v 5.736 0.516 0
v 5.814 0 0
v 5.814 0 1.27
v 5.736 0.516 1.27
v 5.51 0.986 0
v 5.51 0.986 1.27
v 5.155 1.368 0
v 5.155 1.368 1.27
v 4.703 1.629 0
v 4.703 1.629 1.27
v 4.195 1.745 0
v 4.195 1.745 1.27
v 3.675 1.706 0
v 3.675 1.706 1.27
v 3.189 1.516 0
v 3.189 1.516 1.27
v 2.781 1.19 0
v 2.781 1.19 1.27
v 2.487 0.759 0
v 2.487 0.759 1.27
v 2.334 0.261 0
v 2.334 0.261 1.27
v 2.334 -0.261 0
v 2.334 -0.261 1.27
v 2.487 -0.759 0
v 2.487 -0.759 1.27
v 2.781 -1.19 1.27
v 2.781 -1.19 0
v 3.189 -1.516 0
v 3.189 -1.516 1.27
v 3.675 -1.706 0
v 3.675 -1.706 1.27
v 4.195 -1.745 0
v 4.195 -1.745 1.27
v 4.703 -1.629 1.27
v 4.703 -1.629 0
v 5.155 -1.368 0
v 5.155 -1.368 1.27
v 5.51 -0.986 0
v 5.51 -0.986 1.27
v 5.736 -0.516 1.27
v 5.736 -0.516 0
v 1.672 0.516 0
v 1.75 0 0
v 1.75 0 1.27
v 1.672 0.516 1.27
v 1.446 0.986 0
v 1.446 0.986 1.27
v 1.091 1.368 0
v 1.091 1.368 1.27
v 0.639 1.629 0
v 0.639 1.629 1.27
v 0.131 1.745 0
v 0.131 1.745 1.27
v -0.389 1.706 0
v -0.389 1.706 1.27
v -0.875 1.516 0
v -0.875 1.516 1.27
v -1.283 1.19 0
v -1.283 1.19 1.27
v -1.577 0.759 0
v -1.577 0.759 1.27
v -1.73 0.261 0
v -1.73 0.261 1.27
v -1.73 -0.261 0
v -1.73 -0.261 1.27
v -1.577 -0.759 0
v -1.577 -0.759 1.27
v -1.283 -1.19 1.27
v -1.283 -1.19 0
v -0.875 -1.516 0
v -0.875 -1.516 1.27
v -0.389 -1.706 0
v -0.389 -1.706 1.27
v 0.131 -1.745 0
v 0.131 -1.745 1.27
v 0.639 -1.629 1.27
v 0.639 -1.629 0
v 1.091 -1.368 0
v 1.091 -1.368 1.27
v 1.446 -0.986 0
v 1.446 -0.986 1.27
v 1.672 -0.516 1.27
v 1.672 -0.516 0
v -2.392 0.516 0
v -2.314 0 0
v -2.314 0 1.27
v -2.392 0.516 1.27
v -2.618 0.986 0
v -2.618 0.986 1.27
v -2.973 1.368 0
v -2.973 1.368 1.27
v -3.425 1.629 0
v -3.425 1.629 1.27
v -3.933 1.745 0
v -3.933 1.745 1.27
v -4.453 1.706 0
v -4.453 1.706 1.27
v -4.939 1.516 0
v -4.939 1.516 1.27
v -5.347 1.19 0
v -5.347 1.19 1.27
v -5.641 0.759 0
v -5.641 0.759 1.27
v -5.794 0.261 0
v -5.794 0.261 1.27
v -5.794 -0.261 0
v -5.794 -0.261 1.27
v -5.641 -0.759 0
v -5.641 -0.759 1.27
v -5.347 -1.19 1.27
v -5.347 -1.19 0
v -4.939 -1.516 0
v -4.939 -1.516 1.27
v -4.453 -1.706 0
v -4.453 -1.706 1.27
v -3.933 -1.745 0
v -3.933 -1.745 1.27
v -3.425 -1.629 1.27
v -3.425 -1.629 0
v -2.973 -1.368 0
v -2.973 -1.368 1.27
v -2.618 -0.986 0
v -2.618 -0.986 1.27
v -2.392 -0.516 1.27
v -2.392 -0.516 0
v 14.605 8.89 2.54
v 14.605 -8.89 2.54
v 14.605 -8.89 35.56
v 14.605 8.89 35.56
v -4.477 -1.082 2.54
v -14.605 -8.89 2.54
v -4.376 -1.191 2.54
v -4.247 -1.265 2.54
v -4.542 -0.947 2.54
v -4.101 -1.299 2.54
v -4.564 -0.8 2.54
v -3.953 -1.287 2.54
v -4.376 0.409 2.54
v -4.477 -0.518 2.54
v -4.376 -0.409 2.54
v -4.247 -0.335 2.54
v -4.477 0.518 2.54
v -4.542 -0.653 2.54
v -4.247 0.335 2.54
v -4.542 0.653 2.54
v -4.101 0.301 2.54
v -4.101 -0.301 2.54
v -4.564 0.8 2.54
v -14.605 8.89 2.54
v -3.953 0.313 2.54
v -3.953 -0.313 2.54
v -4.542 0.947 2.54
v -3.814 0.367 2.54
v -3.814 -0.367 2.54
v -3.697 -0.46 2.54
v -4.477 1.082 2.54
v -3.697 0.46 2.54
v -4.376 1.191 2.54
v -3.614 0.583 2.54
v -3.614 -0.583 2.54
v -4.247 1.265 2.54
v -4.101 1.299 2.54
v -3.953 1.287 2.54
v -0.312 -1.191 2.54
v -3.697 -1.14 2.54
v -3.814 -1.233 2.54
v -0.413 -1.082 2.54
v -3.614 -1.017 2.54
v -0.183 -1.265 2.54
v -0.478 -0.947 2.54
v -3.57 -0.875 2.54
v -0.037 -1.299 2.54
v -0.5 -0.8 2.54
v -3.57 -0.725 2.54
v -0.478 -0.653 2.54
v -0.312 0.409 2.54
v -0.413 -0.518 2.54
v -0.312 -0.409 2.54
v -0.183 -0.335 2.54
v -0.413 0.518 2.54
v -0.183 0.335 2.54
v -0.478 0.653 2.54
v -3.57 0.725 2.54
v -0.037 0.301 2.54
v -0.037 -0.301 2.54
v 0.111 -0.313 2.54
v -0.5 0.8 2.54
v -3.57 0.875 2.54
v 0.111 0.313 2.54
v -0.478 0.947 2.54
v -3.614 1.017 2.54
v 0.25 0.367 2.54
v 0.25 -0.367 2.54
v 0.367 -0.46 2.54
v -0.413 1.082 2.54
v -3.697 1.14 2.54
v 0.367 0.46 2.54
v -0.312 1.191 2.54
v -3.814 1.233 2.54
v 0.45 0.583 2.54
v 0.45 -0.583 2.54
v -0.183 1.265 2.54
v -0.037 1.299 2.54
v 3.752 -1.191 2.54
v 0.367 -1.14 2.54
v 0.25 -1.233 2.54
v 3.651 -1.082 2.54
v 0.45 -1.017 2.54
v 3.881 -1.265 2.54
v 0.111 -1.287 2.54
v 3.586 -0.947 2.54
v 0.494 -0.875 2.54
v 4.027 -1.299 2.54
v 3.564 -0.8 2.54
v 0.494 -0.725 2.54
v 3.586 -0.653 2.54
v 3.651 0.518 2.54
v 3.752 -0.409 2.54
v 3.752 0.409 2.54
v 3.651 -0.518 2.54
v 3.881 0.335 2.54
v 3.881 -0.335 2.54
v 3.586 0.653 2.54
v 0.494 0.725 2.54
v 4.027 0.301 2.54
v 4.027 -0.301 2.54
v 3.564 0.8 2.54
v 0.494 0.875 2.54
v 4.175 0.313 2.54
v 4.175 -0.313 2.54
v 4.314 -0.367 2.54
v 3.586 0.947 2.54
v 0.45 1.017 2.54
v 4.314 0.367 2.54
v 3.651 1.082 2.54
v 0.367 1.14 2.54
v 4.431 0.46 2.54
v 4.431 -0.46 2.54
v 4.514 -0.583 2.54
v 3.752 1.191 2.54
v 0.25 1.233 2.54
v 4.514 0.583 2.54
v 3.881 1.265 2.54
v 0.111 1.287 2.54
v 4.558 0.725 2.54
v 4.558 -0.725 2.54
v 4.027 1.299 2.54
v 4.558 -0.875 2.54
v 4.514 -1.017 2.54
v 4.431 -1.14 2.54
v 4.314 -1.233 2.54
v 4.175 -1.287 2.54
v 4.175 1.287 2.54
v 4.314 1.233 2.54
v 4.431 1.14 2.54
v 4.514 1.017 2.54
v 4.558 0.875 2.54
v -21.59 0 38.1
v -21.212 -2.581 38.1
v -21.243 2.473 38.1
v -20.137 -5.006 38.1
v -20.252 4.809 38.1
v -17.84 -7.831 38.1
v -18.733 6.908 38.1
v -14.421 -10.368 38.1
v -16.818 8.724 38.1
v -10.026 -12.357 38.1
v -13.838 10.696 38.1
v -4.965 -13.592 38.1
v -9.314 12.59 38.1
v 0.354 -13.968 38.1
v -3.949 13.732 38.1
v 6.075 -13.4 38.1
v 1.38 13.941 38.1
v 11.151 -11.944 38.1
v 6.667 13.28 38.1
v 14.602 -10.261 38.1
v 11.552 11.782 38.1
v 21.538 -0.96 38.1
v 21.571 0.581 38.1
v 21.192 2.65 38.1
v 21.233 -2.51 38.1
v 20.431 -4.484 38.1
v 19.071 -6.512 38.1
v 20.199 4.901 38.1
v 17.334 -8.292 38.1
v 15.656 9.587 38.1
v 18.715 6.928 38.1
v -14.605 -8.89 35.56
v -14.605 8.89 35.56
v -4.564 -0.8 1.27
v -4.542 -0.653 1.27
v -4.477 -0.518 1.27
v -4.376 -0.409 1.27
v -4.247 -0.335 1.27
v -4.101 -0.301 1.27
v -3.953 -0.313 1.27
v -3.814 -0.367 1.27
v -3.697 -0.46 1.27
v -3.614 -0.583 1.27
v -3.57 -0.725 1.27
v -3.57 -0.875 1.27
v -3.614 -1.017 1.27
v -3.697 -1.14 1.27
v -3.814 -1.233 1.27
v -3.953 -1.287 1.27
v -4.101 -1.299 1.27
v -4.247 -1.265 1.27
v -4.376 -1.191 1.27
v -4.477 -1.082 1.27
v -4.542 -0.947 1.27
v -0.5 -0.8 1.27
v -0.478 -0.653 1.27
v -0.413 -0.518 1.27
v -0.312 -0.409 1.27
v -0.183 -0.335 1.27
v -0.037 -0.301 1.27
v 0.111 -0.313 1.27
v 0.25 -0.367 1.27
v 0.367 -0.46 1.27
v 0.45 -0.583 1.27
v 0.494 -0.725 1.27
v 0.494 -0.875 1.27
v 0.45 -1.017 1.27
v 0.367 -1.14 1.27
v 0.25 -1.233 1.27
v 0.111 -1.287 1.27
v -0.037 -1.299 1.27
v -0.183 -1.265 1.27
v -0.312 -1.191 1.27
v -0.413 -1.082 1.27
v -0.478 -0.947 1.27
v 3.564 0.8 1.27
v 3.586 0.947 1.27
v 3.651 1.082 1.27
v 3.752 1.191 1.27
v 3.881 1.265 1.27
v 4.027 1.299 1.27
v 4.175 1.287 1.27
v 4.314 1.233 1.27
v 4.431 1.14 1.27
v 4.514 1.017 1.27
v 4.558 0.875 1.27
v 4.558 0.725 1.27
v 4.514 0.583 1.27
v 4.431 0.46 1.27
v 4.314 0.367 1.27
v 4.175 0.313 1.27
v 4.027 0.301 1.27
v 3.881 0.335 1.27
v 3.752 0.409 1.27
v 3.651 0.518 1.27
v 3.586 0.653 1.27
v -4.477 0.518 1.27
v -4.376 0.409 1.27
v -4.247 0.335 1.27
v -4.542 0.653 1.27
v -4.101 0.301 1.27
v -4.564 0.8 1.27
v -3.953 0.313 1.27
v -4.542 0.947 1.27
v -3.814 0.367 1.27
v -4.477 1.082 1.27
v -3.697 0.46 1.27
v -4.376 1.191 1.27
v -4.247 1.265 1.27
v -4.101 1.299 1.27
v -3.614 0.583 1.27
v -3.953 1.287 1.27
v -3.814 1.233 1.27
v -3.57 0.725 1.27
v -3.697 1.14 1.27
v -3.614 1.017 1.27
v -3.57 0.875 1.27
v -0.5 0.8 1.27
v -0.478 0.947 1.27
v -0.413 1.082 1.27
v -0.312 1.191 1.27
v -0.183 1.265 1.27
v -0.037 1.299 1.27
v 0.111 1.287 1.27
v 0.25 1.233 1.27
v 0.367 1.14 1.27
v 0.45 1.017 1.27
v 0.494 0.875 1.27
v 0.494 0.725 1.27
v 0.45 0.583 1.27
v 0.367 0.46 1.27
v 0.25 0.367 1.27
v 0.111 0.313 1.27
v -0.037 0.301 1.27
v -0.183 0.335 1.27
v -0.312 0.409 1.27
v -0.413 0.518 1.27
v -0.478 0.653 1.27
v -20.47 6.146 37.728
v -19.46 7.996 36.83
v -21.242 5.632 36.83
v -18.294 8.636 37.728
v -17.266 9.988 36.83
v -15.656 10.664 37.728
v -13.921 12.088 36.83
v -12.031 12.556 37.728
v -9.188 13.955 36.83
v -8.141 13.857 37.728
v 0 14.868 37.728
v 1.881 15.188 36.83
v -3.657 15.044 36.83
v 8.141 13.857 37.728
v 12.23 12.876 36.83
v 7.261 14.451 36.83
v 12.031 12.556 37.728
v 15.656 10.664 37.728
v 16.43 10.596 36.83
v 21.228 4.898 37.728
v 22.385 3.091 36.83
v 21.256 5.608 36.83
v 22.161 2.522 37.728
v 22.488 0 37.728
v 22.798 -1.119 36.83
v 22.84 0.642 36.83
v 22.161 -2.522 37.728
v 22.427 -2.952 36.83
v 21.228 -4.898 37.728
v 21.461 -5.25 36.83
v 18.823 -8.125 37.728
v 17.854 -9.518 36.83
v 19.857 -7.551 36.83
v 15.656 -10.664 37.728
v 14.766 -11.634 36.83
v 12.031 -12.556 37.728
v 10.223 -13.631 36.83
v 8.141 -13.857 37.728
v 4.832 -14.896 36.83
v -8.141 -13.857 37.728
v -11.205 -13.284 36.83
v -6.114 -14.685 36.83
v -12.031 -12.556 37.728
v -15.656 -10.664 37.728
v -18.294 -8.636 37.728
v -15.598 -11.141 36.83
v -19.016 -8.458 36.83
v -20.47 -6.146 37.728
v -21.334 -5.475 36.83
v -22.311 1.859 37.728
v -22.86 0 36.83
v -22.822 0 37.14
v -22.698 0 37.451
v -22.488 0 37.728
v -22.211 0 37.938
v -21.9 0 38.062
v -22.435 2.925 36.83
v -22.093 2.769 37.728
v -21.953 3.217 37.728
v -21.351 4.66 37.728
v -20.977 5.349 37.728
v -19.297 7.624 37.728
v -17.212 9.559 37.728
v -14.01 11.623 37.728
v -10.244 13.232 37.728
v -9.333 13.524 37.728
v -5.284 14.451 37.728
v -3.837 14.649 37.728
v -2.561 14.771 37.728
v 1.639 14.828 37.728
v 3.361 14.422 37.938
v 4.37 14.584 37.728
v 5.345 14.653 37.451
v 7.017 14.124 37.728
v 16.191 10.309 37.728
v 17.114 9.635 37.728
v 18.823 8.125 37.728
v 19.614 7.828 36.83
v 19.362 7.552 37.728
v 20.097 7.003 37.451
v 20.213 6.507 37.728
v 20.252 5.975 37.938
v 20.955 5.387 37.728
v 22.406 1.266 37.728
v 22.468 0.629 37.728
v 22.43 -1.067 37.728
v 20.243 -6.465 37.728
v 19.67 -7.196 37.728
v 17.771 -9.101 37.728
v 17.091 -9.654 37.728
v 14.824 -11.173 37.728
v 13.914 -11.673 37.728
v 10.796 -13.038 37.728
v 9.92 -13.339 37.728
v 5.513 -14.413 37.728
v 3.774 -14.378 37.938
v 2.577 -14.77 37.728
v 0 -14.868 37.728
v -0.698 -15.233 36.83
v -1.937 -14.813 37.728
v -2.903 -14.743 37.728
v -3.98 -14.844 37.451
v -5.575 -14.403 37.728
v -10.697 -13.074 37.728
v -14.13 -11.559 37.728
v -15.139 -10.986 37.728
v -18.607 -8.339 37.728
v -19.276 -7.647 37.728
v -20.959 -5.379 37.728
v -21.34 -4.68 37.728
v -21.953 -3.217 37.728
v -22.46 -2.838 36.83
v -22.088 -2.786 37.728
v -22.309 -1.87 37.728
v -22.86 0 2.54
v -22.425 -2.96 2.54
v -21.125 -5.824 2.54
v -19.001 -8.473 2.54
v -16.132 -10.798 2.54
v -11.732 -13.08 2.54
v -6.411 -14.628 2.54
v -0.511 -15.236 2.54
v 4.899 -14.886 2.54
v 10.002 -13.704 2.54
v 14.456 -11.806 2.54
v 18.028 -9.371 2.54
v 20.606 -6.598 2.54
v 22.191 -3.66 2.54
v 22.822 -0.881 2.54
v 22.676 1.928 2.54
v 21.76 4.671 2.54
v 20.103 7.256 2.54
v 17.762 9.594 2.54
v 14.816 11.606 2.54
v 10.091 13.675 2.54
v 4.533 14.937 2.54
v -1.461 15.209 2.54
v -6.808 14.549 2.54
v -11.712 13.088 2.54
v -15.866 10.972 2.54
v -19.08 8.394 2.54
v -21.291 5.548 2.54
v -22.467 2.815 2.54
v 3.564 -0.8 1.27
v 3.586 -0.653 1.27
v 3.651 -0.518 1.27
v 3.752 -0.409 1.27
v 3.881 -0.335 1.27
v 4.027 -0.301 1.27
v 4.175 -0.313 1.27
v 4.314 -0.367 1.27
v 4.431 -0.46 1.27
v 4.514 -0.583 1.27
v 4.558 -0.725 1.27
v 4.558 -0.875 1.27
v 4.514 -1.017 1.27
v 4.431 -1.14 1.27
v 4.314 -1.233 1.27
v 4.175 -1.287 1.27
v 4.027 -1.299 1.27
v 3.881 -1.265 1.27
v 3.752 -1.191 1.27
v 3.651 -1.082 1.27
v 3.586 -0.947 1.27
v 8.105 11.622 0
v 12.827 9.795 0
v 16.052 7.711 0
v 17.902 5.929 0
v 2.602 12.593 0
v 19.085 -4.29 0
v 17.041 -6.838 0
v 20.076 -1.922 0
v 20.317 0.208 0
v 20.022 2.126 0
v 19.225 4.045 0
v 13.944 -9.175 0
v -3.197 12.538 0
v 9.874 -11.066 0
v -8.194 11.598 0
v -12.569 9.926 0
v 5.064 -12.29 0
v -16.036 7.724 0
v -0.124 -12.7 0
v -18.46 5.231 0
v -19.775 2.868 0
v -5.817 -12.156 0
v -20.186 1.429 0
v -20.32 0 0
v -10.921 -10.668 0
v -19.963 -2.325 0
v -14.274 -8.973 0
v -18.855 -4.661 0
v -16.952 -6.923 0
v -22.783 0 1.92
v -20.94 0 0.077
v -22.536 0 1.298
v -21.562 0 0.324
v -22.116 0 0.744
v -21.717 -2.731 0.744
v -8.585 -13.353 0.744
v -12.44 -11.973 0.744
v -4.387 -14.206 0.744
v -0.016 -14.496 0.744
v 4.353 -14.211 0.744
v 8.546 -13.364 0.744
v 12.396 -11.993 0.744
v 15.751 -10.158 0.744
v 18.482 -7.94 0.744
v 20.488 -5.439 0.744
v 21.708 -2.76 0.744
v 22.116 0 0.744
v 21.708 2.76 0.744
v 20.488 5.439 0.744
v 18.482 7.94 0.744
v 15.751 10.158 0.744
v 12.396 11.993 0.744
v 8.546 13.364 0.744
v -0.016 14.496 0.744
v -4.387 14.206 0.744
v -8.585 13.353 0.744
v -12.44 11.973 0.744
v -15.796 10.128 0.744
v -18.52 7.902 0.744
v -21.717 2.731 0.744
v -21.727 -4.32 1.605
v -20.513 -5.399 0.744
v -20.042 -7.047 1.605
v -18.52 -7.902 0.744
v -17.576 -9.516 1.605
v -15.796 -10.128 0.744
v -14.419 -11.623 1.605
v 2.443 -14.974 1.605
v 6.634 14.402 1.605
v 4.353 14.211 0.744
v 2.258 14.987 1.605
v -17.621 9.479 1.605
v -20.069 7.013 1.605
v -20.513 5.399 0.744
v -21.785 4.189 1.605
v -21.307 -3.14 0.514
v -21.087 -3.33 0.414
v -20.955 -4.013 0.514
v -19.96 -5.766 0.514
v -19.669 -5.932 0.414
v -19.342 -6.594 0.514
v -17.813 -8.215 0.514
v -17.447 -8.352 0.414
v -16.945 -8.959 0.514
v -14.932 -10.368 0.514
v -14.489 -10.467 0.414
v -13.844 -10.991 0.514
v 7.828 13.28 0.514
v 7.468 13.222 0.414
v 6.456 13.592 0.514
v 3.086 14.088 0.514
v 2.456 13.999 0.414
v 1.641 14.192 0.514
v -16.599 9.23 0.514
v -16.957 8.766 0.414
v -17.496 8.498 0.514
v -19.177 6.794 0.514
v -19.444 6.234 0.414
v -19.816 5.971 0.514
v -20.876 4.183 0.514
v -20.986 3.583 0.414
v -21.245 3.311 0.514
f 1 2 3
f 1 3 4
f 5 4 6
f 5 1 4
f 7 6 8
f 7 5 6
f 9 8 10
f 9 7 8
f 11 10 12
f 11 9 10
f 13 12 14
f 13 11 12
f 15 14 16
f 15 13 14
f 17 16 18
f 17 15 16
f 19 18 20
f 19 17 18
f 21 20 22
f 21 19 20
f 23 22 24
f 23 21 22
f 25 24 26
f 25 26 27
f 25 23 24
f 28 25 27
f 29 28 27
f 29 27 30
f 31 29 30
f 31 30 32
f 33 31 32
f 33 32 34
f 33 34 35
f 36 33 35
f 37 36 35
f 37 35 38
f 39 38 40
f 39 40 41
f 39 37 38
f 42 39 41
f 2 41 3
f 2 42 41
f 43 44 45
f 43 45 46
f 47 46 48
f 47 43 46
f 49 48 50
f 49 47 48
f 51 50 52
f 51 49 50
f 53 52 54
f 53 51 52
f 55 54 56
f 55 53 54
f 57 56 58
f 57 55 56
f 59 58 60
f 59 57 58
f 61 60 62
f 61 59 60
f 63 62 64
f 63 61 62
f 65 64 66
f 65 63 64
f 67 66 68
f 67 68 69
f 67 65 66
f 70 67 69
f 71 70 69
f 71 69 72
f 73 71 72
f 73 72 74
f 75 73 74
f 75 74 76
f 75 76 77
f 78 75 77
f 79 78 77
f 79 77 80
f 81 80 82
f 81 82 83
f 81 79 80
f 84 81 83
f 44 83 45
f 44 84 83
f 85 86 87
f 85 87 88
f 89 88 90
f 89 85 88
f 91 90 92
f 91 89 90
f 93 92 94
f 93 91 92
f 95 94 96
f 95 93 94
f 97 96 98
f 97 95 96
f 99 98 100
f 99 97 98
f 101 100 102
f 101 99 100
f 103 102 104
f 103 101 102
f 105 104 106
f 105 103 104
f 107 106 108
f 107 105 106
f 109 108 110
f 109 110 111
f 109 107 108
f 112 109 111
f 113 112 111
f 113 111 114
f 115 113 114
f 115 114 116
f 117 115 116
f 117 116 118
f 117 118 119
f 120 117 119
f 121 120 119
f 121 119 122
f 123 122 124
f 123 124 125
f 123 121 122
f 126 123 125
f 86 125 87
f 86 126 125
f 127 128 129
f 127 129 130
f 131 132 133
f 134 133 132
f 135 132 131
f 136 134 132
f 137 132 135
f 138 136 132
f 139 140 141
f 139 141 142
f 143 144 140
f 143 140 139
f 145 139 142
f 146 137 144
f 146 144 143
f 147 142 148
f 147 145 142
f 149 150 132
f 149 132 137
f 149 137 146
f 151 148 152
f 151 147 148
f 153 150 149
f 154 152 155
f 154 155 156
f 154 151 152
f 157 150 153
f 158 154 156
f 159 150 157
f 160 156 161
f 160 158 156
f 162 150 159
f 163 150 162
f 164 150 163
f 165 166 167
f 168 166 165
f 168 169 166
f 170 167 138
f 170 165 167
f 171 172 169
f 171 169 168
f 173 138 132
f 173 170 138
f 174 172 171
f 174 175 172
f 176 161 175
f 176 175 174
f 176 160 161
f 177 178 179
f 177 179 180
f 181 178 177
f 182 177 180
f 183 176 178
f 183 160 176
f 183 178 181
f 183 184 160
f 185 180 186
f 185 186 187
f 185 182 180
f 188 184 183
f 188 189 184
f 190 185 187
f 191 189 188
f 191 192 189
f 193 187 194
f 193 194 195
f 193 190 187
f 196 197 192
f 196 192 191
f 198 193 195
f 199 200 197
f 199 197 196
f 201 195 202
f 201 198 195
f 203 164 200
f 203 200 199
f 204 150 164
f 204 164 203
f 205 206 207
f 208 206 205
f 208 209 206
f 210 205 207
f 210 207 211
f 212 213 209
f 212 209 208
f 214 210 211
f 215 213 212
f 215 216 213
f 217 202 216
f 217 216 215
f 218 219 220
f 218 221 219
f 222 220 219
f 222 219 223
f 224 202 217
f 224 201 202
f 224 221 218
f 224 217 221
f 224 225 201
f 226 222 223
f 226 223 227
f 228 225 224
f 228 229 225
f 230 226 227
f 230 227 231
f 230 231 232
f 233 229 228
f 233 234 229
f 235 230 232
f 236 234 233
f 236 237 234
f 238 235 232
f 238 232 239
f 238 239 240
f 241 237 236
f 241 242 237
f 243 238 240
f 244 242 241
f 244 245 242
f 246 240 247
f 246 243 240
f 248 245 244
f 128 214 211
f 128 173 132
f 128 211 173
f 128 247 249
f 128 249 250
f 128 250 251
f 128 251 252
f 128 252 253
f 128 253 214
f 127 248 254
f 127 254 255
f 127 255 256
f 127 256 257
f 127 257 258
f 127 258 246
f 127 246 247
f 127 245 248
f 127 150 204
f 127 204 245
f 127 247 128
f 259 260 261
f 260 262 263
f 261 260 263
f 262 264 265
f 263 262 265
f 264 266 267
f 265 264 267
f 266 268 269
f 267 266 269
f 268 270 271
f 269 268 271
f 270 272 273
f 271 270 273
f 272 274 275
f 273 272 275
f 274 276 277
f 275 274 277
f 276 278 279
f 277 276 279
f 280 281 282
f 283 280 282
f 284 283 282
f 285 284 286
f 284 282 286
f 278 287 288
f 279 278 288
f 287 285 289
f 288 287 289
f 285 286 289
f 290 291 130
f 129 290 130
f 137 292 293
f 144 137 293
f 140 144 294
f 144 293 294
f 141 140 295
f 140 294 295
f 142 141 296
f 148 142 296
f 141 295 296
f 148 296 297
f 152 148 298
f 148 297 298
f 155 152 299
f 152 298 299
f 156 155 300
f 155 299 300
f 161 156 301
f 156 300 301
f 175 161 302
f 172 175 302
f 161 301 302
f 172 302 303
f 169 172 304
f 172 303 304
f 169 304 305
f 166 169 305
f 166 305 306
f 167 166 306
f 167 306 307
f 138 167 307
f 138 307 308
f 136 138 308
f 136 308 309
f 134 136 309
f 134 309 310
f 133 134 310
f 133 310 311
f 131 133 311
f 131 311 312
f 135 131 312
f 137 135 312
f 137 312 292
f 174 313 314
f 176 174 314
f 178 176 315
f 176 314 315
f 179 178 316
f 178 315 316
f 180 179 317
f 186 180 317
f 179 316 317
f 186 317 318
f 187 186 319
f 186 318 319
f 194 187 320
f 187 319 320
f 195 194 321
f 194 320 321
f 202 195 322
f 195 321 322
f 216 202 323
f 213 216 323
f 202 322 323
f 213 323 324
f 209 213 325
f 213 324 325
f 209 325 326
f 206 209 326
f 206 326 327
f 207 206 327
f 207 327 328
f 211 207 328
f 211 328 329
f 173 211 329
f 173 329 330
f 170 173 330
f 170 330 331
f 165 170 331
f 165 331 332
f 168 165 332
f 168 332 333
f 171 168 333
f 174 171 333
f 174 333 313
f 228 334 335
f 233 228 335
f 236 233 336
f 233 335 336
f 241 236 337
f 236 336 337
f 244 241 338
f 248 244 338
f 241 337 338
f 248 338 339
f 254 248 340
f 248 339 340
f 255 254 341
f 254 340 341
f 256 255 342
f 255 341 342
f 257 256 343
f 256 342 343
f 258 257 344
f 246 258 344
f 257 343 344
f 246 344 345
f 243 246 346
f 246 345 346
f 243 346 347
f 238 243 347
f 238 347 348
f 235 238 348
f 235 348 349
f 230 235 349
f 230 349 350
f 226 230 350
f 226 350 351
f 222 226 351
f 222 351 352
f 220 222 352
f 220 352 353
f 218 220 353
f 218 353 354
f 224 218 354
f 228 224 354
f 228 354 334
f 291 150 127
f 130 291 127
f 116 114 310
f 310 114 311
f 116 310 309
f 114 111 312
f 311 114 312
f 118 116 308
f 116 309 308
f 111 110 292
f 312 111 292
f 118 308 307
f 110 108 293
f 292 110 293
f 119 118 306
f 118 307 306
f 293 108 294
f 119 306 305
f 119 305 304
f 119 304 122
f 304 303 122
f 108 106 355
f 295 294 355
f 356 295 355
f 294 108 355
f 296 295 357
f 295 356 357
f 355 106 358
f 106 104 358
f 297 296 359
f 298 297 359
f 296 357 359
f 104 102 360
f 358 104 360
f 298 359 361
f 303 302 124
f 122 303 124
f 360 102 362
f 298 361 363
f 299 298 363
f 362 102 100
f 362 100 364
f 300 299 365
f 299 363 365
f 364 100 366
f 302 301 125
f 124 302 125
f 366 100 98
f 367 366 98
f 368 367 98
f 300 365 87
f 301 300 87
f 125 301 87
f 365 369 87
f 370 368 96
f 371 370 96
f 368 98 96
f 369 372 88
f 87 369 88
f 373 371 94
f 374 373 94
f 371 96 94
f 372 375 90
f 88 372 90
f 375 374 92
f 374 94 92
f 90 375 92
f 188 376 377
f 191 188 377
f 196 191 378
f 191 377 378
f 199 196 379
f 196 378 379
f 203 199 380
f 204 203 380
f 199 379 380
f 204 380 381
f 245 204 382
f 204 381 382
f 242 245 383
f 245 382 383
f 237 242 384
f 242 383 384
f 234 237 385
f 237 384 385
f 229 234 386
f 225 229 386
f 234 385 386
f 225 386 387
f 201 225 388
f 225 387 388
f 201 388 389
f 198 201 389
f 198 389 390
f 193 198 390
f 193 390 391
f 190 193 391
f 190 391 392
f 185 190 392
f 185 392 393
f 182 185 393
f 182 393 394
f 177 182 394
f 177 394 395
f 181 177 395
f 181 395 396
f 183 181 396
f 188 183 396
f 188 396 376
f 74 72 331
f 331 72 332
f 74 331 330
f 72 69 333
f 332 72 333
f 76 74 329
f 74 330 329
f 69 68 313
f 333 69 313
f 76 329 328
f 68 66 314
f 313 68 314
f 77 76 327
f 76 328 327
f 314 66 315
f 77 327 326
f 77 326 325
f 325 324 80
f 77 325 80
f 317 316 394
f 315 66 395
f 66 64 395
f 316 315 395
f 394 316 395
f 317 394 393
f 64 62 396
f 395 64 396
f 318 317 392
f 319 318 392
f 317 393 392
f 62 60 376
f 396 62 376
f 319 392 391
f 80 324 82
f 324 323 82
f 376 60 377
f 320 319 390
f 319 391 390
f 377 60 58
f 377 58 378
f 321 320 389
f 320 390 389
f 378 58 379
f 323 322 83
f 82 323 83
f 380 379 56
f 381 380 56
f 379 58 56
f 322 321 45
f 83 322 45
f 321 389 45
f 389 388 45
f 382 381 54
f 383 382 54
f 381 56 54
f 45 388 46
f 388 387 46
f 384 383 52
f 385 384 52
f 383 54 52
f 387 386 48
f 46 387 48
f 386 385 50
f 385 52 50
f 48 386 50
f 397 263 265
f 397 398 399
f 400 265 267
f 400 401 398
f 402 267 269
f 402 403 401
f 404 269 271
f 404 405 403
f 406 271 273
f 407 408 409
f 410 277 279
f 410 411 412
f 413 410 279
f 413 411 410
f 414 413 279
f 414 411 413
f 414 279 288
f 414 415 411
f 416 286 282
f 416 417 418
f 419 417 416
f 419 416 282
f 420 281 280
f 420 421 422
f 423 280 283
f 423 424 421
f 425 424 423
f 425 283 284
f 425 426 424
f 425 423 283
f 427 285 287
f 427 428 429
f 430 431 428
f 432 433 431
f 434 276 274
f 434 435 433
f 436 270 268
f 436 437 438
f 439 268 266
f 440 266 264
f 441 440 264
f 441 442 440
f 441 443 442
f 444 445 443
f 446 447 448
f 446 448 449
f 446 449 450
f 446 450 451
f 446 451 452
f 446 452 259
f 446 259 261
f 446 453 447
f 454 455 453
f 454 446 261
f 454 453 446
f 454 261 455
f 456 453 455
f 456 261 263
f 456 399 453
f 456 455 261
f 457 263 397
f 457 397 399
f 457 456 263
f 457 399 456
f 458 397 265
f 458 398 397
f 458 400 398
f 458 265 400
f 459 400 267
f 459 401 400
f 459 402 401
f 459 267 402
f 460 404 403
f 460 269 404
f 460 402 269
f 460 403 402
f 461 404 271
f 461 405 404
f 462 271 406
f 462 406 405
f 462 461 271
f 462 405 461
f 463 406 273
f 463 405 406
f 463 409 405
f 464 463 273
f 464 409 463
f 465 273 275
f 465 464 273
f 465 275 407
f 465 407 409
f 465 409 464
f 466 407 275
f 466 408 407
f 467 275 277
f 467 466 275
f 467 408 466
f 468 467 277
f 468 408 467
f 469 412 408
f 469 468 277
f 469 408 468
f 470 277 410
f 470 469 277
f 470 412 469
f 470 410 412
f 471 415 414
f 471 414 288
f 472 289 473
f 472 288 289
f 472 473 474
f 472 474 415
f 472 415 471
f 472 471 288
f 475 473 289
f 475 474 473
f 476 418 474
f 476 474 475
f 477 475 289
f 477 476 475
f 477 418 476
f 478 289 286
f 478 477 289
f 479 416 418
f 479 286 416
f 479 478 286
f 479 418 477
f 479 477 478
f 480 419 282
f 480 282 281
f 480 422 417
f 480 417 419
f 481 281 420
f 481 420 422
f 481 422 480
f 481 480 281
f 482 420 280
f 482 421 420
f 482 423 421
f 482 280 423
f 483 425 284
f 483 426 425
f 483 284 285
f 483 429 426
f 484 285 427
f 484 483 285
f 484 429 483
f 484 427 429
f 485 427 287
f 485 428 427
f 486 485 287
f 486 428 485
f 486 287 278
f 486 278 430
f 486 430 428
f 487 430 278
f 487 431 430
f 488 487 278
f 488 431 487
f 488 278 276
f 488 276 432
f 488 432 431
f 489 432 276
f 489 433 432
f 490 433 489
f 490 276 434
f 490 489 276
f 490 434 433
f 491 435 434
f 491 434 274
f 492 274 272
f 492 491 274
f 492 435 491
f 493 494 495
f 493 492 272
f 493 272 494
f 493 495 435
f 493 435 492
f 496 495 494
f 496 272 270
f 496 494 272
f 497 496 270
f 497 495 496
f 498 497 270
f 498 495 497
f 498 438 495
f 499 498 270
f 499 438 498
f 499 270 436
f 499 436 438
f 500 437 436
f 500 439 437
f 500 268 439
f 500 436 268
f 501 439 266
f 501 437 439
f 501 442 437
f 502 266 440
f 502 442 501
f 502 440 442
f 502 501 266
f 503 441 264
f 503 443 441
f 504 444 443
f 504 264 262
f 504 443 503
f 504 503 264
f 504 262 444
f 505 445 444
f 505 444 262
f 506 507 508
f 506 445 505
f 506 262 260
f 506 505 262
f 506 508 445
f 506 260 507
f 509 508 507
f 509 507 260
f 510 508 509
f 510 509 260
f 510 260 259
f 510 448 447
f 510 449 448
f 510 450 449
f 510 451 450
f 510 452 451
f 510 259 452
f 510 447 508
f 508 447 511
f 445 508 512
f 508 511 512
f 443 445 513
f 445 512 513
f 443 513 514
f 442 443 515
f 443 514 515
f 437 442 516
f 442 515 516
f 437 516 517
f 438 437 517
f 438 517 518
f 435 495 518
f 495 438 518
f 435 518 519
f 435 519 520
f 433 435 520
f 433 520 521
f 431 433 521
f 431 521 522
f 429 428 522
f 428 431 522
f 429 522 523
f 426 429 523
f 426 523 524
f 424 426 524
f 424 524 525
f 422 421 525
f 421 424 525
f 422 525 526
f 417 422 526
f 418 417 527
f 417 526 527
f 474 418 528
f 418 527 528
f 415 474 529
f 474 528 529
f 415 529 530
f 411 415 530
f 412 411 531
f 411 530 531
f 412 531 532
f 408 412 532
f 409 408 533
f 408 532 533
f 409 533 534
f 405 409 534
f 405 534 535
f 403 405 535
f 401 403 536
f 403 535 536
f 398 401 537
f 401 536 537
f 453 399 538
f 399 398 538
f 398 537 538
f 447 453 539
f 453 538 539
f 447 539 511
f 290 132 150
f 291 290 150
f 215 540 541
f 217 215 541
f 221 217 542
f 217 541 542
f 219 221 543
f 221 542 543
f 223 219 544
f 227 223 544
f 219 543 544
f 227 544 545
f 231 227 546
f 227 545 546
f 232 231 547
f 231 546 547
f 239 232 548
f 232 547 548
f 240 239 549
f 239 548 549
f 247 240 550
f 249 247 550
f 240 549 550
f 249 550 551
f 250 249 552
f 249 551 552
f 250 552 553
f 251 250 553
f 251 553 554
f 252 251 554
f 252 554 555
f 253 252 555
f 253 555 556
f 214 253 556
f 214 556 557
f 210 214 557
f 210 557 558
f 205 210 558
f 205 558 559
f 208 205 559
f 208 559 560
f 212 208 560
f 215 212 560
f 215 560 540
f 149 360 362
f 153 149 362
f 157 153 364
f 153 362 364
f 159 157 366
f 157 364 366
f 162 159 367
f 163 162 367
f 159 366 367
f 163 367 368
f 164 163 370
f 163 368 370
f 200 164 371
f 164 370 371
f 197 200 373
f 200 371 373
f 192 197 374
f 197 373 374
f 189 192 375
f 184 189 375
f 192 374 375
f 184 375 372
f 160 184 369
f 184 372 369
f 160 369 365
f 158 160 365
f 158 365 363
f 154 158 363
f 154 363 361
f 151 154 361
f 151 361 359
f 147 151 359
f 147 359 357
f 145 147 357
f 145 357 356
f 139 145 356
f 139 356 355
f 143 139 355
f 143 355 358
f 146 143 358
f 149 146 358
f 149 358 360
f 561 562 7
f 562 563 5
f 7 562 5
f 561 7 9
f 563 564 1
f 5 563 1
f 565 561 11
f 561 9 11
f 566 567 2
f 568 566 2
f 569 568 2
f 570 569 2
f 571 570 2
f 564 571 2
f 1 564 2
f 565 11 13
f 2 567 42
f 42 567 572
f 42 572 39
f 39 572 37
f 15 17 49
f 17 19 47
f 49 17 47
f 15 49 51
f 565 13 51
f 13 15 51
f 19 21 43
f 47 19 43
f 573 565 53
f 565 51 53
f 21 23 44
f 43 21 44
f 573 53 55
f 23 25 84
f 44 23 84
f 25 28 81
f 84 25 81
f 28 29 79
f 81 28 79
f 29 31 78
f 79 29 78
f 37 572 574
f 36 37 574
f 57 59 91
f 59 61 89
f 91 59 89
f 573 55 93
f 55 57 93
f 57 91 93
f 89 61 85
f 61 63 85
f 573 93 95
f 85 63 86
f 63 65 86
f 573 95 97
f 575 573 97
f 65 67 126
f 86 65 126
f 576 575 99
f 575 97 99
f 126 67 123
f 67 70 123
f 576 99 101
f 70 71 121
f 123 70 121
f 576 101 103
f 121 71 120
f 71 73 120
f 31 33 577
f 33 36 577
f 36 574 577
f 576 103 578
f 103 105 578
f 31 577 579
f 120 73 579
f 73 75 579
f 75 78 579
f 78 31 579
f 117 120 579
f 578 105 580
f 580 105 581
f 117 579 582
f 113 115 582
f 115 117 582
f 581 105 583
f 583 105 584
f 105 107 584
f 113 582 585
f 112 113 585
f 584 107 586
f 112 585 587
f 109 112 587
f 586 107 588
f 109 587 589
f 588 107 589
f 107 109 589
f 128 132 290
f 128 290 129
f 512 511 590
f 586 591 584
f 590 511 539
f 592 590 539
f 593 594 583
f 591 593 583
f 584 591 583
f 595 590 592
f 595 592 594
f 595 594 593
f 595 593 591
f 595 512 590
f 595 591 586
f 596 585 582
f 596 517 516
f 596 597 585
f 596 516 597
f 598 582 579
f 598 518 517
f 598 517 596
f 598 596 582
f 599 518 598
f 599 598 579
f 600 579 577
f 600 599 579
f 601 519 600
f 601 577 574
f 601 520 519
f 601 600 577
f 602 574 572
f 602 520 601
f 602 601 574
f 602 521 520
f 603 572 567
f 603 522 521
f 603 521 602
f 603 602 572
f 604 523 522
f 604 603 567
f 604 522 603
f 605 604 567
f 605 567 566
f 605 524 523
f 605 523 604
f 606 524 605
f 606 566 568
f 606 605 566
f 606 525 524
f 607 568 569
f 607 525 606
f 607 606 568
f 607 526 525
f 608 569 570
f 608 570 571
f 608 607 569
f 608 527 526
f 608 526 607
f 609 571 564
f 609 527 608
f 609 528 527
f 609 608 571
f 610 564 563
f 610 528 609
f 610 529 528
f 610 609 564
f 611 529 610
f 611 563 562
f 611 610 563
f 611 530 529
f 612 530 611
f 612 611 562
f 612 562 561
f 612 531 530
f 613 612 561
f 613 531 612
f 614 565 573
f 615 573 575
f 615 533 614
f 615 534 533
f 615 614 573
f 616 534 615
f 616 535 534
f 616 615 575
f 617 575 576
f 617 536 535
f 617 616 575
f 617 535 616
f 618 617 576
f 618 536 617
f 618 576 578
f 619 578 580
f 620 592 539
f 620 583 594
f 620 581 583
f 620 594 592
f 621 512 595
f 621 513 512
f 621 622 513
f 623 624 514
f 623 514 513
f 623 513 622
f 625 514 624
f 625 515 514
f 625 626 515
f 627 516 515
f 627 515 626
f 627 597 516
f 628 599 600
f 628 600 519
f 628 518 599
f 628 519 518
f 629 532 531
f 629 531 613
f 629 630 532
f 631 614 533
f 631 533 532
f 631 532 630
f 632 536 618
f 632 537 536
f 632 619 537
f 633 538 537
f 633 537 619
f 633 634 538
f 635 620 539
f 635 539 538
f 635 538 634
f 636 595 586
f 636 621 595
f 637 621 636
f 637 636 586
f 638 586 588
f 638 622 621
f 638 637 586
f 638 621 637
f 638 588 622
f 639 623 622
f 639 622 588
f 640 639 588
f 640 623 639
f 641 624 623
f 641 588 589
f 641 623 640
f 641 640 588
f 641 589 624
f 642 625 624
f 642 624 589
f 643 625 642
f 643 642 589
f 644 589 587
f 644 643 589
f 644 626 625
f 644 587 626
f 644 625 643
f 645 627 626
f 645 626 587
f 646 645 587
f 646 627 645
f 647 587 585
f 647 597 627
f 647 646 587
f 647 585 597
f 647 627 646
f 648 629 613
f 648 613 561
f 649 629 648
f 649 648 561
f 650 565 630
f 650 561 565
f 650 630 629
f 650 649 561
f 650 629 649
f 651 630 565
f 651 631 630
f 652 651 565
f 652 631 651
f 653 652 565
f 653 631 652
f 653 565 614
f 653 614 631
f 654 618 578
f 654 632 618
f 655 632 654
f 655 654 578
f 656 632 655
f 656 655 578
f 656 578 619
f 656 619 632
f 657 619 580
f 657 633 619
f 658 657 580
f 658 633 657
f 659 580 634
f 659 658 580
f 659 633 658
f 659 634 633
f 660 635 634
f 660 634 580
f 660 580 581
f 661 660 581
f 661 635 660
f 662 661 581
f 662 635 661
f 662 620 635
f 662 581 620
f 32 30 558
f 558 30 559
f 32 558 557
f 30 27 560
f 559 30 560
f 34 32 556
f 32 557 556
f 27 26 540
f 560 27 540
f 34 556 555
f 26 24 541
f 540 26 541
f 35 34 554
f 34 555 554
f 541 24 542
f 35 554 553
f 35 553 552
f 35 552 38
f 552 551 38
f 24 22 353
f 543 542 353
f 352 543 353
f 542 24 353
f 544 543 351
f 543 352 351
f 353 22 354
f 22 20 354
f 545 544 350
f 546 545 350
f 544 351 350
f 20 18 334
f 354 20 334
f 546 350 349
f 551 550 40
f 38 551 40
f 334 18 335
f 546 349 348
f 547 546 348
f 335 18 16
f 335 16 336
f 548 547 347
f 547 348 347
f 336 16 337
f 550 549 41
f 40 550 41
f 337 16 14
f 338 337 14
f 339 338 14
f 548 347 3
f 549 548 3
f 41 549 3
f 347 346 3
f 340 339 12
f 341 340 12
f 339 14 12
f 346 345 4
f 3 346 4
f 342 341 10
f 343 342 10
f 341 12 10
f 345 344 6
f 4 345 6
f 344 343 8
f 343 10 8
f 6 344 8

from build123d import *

# Parameters (mm, degrees)
SKETCH1_RX              = 22.86
SKETCH1_RY              = 15.24
BOSS_EXTRUDE4_DEPTH     = 45.72
CUT_EXTRUDE2_START      = -10.16
SKETCH4_W               = 29.21
SKETCH4_H               = 17.78
CUT_EXTRUDE2_DEPTH      = 33.02
SKETCH7_W               = 14.643913221
SKETCH7_H               = 35.56
CUT_EXTRUDE4_DEPTH      = 33.02
CUT_EXTRUDE4_DEPTH_BACK = 33.02
SKETCH8_R               = 1.75
CUT_EXTRUDE5_DEPTH      = 1.27
SKETCH9_R               = 0.5
CUT_EXTRUDE7_DEPTH      = 2.794
FILLET1_R               = 2.54
FILLET2_R               = 1.27


with BuildPart() as part:
    # Sketch1 → Boss-Extrude4 (new body)
    with BuildSketch(Plane.XY):
        with Locations(Location((0, 0), (0, 0, 180))):
            Ellipse(SKETCH1_RX, SKETCH1_RY)
    extrude(amount=BOSS_EXTRUDE4_DEPTH)

    # Sketch4 → Cut-Extrude2 (cut)
    with BuildSketch(Plane.XY.offset(45.72).offset(CUT_EXTRUDE2_START)):
        Rectangle(SKETCH4_W, SKETCH4_H)
    extrude(amount=-CUT_EXTRUDE2_DEPTH, mode=Mode.SUBTRACT)

    # Sketch7 → Cut-Extrude4 (cut, two sides)
    with BuildSketch(Plane(origin=(0, 0, 0), x_dir=(0, 0, -1), z_dir=(1, 0, 0))) as cut_extrude4_sk:
        with Locations((-45.421956611, -1.677648267)):
            Rectangle(SKETCH7_W, SKETCH7_H)
    extrude(amount=CUT_EXTRUDE4_DEPTH, mode=Mode.SUBTRACT)
    extrude(cut_extrude4_sk.sketch, amount=-CUT_EXTRUDE4_DEPTH_BACK, mode=Mode.SUBTRACT)

    # Sketch8 → Cut-Extrude5 (cut)
    with BuildSketch(Plane.XY):
        Circle(SKETCH8_R)
        with Locations((4.064, 0)):
            Circle(SKETCH8_R)
        with Locations((-4.064, 0)):
            Circle(SKETCH8_R)
    extrude(amount=CUT_EXTRUDE5_DEPTH, mode=Mode.SUBTRACT)

    # Sketch9 → Cut-Extrude7 (cut)
    with BuildSketch(Plane(origin=(0, 0, 0), x_dir=(-1, 0, 0), z_dir=(0, 0, -1))):
        with Locations((0, 0.8)):
            Circle(SKETCH9_R)
        with Locations((0, -0.8)):
            Circle(SKETCH9_R)
        with Locations((-4.064, 0.8)):
            Circle(SKETCH9_R)
        with Locations((-4.064, -0.8)):
            Circle(SKETCH9_R)
        with Locations((4.064, 0.8)):
            Circle(SKETCH9_R)
        with Locations((4.064, -0.8)):
            Circle(SKETCH9_R)
    extrude(amount=-CUT_EXTRUDE7_DEPTH, mode=Mode.SUBTRACT)

    # Fillet1
    fillet1_edges = [part.edges().sort_by_distance(p)[0] for p in [
        (22.859987041, 0.016227247, 0),
    ]]
    fillet(fillet1_edges, radius=FILLET1_R)

    # Fillet2
    fillet2_edges = [part.edges().sort_by_distance(p)[0] for p in [
        (22.860000074, 1.7e-08, 38.1),
    ]]
    fillet(fillet2_edges, radius=FILLET2_R)


solid = part.part
